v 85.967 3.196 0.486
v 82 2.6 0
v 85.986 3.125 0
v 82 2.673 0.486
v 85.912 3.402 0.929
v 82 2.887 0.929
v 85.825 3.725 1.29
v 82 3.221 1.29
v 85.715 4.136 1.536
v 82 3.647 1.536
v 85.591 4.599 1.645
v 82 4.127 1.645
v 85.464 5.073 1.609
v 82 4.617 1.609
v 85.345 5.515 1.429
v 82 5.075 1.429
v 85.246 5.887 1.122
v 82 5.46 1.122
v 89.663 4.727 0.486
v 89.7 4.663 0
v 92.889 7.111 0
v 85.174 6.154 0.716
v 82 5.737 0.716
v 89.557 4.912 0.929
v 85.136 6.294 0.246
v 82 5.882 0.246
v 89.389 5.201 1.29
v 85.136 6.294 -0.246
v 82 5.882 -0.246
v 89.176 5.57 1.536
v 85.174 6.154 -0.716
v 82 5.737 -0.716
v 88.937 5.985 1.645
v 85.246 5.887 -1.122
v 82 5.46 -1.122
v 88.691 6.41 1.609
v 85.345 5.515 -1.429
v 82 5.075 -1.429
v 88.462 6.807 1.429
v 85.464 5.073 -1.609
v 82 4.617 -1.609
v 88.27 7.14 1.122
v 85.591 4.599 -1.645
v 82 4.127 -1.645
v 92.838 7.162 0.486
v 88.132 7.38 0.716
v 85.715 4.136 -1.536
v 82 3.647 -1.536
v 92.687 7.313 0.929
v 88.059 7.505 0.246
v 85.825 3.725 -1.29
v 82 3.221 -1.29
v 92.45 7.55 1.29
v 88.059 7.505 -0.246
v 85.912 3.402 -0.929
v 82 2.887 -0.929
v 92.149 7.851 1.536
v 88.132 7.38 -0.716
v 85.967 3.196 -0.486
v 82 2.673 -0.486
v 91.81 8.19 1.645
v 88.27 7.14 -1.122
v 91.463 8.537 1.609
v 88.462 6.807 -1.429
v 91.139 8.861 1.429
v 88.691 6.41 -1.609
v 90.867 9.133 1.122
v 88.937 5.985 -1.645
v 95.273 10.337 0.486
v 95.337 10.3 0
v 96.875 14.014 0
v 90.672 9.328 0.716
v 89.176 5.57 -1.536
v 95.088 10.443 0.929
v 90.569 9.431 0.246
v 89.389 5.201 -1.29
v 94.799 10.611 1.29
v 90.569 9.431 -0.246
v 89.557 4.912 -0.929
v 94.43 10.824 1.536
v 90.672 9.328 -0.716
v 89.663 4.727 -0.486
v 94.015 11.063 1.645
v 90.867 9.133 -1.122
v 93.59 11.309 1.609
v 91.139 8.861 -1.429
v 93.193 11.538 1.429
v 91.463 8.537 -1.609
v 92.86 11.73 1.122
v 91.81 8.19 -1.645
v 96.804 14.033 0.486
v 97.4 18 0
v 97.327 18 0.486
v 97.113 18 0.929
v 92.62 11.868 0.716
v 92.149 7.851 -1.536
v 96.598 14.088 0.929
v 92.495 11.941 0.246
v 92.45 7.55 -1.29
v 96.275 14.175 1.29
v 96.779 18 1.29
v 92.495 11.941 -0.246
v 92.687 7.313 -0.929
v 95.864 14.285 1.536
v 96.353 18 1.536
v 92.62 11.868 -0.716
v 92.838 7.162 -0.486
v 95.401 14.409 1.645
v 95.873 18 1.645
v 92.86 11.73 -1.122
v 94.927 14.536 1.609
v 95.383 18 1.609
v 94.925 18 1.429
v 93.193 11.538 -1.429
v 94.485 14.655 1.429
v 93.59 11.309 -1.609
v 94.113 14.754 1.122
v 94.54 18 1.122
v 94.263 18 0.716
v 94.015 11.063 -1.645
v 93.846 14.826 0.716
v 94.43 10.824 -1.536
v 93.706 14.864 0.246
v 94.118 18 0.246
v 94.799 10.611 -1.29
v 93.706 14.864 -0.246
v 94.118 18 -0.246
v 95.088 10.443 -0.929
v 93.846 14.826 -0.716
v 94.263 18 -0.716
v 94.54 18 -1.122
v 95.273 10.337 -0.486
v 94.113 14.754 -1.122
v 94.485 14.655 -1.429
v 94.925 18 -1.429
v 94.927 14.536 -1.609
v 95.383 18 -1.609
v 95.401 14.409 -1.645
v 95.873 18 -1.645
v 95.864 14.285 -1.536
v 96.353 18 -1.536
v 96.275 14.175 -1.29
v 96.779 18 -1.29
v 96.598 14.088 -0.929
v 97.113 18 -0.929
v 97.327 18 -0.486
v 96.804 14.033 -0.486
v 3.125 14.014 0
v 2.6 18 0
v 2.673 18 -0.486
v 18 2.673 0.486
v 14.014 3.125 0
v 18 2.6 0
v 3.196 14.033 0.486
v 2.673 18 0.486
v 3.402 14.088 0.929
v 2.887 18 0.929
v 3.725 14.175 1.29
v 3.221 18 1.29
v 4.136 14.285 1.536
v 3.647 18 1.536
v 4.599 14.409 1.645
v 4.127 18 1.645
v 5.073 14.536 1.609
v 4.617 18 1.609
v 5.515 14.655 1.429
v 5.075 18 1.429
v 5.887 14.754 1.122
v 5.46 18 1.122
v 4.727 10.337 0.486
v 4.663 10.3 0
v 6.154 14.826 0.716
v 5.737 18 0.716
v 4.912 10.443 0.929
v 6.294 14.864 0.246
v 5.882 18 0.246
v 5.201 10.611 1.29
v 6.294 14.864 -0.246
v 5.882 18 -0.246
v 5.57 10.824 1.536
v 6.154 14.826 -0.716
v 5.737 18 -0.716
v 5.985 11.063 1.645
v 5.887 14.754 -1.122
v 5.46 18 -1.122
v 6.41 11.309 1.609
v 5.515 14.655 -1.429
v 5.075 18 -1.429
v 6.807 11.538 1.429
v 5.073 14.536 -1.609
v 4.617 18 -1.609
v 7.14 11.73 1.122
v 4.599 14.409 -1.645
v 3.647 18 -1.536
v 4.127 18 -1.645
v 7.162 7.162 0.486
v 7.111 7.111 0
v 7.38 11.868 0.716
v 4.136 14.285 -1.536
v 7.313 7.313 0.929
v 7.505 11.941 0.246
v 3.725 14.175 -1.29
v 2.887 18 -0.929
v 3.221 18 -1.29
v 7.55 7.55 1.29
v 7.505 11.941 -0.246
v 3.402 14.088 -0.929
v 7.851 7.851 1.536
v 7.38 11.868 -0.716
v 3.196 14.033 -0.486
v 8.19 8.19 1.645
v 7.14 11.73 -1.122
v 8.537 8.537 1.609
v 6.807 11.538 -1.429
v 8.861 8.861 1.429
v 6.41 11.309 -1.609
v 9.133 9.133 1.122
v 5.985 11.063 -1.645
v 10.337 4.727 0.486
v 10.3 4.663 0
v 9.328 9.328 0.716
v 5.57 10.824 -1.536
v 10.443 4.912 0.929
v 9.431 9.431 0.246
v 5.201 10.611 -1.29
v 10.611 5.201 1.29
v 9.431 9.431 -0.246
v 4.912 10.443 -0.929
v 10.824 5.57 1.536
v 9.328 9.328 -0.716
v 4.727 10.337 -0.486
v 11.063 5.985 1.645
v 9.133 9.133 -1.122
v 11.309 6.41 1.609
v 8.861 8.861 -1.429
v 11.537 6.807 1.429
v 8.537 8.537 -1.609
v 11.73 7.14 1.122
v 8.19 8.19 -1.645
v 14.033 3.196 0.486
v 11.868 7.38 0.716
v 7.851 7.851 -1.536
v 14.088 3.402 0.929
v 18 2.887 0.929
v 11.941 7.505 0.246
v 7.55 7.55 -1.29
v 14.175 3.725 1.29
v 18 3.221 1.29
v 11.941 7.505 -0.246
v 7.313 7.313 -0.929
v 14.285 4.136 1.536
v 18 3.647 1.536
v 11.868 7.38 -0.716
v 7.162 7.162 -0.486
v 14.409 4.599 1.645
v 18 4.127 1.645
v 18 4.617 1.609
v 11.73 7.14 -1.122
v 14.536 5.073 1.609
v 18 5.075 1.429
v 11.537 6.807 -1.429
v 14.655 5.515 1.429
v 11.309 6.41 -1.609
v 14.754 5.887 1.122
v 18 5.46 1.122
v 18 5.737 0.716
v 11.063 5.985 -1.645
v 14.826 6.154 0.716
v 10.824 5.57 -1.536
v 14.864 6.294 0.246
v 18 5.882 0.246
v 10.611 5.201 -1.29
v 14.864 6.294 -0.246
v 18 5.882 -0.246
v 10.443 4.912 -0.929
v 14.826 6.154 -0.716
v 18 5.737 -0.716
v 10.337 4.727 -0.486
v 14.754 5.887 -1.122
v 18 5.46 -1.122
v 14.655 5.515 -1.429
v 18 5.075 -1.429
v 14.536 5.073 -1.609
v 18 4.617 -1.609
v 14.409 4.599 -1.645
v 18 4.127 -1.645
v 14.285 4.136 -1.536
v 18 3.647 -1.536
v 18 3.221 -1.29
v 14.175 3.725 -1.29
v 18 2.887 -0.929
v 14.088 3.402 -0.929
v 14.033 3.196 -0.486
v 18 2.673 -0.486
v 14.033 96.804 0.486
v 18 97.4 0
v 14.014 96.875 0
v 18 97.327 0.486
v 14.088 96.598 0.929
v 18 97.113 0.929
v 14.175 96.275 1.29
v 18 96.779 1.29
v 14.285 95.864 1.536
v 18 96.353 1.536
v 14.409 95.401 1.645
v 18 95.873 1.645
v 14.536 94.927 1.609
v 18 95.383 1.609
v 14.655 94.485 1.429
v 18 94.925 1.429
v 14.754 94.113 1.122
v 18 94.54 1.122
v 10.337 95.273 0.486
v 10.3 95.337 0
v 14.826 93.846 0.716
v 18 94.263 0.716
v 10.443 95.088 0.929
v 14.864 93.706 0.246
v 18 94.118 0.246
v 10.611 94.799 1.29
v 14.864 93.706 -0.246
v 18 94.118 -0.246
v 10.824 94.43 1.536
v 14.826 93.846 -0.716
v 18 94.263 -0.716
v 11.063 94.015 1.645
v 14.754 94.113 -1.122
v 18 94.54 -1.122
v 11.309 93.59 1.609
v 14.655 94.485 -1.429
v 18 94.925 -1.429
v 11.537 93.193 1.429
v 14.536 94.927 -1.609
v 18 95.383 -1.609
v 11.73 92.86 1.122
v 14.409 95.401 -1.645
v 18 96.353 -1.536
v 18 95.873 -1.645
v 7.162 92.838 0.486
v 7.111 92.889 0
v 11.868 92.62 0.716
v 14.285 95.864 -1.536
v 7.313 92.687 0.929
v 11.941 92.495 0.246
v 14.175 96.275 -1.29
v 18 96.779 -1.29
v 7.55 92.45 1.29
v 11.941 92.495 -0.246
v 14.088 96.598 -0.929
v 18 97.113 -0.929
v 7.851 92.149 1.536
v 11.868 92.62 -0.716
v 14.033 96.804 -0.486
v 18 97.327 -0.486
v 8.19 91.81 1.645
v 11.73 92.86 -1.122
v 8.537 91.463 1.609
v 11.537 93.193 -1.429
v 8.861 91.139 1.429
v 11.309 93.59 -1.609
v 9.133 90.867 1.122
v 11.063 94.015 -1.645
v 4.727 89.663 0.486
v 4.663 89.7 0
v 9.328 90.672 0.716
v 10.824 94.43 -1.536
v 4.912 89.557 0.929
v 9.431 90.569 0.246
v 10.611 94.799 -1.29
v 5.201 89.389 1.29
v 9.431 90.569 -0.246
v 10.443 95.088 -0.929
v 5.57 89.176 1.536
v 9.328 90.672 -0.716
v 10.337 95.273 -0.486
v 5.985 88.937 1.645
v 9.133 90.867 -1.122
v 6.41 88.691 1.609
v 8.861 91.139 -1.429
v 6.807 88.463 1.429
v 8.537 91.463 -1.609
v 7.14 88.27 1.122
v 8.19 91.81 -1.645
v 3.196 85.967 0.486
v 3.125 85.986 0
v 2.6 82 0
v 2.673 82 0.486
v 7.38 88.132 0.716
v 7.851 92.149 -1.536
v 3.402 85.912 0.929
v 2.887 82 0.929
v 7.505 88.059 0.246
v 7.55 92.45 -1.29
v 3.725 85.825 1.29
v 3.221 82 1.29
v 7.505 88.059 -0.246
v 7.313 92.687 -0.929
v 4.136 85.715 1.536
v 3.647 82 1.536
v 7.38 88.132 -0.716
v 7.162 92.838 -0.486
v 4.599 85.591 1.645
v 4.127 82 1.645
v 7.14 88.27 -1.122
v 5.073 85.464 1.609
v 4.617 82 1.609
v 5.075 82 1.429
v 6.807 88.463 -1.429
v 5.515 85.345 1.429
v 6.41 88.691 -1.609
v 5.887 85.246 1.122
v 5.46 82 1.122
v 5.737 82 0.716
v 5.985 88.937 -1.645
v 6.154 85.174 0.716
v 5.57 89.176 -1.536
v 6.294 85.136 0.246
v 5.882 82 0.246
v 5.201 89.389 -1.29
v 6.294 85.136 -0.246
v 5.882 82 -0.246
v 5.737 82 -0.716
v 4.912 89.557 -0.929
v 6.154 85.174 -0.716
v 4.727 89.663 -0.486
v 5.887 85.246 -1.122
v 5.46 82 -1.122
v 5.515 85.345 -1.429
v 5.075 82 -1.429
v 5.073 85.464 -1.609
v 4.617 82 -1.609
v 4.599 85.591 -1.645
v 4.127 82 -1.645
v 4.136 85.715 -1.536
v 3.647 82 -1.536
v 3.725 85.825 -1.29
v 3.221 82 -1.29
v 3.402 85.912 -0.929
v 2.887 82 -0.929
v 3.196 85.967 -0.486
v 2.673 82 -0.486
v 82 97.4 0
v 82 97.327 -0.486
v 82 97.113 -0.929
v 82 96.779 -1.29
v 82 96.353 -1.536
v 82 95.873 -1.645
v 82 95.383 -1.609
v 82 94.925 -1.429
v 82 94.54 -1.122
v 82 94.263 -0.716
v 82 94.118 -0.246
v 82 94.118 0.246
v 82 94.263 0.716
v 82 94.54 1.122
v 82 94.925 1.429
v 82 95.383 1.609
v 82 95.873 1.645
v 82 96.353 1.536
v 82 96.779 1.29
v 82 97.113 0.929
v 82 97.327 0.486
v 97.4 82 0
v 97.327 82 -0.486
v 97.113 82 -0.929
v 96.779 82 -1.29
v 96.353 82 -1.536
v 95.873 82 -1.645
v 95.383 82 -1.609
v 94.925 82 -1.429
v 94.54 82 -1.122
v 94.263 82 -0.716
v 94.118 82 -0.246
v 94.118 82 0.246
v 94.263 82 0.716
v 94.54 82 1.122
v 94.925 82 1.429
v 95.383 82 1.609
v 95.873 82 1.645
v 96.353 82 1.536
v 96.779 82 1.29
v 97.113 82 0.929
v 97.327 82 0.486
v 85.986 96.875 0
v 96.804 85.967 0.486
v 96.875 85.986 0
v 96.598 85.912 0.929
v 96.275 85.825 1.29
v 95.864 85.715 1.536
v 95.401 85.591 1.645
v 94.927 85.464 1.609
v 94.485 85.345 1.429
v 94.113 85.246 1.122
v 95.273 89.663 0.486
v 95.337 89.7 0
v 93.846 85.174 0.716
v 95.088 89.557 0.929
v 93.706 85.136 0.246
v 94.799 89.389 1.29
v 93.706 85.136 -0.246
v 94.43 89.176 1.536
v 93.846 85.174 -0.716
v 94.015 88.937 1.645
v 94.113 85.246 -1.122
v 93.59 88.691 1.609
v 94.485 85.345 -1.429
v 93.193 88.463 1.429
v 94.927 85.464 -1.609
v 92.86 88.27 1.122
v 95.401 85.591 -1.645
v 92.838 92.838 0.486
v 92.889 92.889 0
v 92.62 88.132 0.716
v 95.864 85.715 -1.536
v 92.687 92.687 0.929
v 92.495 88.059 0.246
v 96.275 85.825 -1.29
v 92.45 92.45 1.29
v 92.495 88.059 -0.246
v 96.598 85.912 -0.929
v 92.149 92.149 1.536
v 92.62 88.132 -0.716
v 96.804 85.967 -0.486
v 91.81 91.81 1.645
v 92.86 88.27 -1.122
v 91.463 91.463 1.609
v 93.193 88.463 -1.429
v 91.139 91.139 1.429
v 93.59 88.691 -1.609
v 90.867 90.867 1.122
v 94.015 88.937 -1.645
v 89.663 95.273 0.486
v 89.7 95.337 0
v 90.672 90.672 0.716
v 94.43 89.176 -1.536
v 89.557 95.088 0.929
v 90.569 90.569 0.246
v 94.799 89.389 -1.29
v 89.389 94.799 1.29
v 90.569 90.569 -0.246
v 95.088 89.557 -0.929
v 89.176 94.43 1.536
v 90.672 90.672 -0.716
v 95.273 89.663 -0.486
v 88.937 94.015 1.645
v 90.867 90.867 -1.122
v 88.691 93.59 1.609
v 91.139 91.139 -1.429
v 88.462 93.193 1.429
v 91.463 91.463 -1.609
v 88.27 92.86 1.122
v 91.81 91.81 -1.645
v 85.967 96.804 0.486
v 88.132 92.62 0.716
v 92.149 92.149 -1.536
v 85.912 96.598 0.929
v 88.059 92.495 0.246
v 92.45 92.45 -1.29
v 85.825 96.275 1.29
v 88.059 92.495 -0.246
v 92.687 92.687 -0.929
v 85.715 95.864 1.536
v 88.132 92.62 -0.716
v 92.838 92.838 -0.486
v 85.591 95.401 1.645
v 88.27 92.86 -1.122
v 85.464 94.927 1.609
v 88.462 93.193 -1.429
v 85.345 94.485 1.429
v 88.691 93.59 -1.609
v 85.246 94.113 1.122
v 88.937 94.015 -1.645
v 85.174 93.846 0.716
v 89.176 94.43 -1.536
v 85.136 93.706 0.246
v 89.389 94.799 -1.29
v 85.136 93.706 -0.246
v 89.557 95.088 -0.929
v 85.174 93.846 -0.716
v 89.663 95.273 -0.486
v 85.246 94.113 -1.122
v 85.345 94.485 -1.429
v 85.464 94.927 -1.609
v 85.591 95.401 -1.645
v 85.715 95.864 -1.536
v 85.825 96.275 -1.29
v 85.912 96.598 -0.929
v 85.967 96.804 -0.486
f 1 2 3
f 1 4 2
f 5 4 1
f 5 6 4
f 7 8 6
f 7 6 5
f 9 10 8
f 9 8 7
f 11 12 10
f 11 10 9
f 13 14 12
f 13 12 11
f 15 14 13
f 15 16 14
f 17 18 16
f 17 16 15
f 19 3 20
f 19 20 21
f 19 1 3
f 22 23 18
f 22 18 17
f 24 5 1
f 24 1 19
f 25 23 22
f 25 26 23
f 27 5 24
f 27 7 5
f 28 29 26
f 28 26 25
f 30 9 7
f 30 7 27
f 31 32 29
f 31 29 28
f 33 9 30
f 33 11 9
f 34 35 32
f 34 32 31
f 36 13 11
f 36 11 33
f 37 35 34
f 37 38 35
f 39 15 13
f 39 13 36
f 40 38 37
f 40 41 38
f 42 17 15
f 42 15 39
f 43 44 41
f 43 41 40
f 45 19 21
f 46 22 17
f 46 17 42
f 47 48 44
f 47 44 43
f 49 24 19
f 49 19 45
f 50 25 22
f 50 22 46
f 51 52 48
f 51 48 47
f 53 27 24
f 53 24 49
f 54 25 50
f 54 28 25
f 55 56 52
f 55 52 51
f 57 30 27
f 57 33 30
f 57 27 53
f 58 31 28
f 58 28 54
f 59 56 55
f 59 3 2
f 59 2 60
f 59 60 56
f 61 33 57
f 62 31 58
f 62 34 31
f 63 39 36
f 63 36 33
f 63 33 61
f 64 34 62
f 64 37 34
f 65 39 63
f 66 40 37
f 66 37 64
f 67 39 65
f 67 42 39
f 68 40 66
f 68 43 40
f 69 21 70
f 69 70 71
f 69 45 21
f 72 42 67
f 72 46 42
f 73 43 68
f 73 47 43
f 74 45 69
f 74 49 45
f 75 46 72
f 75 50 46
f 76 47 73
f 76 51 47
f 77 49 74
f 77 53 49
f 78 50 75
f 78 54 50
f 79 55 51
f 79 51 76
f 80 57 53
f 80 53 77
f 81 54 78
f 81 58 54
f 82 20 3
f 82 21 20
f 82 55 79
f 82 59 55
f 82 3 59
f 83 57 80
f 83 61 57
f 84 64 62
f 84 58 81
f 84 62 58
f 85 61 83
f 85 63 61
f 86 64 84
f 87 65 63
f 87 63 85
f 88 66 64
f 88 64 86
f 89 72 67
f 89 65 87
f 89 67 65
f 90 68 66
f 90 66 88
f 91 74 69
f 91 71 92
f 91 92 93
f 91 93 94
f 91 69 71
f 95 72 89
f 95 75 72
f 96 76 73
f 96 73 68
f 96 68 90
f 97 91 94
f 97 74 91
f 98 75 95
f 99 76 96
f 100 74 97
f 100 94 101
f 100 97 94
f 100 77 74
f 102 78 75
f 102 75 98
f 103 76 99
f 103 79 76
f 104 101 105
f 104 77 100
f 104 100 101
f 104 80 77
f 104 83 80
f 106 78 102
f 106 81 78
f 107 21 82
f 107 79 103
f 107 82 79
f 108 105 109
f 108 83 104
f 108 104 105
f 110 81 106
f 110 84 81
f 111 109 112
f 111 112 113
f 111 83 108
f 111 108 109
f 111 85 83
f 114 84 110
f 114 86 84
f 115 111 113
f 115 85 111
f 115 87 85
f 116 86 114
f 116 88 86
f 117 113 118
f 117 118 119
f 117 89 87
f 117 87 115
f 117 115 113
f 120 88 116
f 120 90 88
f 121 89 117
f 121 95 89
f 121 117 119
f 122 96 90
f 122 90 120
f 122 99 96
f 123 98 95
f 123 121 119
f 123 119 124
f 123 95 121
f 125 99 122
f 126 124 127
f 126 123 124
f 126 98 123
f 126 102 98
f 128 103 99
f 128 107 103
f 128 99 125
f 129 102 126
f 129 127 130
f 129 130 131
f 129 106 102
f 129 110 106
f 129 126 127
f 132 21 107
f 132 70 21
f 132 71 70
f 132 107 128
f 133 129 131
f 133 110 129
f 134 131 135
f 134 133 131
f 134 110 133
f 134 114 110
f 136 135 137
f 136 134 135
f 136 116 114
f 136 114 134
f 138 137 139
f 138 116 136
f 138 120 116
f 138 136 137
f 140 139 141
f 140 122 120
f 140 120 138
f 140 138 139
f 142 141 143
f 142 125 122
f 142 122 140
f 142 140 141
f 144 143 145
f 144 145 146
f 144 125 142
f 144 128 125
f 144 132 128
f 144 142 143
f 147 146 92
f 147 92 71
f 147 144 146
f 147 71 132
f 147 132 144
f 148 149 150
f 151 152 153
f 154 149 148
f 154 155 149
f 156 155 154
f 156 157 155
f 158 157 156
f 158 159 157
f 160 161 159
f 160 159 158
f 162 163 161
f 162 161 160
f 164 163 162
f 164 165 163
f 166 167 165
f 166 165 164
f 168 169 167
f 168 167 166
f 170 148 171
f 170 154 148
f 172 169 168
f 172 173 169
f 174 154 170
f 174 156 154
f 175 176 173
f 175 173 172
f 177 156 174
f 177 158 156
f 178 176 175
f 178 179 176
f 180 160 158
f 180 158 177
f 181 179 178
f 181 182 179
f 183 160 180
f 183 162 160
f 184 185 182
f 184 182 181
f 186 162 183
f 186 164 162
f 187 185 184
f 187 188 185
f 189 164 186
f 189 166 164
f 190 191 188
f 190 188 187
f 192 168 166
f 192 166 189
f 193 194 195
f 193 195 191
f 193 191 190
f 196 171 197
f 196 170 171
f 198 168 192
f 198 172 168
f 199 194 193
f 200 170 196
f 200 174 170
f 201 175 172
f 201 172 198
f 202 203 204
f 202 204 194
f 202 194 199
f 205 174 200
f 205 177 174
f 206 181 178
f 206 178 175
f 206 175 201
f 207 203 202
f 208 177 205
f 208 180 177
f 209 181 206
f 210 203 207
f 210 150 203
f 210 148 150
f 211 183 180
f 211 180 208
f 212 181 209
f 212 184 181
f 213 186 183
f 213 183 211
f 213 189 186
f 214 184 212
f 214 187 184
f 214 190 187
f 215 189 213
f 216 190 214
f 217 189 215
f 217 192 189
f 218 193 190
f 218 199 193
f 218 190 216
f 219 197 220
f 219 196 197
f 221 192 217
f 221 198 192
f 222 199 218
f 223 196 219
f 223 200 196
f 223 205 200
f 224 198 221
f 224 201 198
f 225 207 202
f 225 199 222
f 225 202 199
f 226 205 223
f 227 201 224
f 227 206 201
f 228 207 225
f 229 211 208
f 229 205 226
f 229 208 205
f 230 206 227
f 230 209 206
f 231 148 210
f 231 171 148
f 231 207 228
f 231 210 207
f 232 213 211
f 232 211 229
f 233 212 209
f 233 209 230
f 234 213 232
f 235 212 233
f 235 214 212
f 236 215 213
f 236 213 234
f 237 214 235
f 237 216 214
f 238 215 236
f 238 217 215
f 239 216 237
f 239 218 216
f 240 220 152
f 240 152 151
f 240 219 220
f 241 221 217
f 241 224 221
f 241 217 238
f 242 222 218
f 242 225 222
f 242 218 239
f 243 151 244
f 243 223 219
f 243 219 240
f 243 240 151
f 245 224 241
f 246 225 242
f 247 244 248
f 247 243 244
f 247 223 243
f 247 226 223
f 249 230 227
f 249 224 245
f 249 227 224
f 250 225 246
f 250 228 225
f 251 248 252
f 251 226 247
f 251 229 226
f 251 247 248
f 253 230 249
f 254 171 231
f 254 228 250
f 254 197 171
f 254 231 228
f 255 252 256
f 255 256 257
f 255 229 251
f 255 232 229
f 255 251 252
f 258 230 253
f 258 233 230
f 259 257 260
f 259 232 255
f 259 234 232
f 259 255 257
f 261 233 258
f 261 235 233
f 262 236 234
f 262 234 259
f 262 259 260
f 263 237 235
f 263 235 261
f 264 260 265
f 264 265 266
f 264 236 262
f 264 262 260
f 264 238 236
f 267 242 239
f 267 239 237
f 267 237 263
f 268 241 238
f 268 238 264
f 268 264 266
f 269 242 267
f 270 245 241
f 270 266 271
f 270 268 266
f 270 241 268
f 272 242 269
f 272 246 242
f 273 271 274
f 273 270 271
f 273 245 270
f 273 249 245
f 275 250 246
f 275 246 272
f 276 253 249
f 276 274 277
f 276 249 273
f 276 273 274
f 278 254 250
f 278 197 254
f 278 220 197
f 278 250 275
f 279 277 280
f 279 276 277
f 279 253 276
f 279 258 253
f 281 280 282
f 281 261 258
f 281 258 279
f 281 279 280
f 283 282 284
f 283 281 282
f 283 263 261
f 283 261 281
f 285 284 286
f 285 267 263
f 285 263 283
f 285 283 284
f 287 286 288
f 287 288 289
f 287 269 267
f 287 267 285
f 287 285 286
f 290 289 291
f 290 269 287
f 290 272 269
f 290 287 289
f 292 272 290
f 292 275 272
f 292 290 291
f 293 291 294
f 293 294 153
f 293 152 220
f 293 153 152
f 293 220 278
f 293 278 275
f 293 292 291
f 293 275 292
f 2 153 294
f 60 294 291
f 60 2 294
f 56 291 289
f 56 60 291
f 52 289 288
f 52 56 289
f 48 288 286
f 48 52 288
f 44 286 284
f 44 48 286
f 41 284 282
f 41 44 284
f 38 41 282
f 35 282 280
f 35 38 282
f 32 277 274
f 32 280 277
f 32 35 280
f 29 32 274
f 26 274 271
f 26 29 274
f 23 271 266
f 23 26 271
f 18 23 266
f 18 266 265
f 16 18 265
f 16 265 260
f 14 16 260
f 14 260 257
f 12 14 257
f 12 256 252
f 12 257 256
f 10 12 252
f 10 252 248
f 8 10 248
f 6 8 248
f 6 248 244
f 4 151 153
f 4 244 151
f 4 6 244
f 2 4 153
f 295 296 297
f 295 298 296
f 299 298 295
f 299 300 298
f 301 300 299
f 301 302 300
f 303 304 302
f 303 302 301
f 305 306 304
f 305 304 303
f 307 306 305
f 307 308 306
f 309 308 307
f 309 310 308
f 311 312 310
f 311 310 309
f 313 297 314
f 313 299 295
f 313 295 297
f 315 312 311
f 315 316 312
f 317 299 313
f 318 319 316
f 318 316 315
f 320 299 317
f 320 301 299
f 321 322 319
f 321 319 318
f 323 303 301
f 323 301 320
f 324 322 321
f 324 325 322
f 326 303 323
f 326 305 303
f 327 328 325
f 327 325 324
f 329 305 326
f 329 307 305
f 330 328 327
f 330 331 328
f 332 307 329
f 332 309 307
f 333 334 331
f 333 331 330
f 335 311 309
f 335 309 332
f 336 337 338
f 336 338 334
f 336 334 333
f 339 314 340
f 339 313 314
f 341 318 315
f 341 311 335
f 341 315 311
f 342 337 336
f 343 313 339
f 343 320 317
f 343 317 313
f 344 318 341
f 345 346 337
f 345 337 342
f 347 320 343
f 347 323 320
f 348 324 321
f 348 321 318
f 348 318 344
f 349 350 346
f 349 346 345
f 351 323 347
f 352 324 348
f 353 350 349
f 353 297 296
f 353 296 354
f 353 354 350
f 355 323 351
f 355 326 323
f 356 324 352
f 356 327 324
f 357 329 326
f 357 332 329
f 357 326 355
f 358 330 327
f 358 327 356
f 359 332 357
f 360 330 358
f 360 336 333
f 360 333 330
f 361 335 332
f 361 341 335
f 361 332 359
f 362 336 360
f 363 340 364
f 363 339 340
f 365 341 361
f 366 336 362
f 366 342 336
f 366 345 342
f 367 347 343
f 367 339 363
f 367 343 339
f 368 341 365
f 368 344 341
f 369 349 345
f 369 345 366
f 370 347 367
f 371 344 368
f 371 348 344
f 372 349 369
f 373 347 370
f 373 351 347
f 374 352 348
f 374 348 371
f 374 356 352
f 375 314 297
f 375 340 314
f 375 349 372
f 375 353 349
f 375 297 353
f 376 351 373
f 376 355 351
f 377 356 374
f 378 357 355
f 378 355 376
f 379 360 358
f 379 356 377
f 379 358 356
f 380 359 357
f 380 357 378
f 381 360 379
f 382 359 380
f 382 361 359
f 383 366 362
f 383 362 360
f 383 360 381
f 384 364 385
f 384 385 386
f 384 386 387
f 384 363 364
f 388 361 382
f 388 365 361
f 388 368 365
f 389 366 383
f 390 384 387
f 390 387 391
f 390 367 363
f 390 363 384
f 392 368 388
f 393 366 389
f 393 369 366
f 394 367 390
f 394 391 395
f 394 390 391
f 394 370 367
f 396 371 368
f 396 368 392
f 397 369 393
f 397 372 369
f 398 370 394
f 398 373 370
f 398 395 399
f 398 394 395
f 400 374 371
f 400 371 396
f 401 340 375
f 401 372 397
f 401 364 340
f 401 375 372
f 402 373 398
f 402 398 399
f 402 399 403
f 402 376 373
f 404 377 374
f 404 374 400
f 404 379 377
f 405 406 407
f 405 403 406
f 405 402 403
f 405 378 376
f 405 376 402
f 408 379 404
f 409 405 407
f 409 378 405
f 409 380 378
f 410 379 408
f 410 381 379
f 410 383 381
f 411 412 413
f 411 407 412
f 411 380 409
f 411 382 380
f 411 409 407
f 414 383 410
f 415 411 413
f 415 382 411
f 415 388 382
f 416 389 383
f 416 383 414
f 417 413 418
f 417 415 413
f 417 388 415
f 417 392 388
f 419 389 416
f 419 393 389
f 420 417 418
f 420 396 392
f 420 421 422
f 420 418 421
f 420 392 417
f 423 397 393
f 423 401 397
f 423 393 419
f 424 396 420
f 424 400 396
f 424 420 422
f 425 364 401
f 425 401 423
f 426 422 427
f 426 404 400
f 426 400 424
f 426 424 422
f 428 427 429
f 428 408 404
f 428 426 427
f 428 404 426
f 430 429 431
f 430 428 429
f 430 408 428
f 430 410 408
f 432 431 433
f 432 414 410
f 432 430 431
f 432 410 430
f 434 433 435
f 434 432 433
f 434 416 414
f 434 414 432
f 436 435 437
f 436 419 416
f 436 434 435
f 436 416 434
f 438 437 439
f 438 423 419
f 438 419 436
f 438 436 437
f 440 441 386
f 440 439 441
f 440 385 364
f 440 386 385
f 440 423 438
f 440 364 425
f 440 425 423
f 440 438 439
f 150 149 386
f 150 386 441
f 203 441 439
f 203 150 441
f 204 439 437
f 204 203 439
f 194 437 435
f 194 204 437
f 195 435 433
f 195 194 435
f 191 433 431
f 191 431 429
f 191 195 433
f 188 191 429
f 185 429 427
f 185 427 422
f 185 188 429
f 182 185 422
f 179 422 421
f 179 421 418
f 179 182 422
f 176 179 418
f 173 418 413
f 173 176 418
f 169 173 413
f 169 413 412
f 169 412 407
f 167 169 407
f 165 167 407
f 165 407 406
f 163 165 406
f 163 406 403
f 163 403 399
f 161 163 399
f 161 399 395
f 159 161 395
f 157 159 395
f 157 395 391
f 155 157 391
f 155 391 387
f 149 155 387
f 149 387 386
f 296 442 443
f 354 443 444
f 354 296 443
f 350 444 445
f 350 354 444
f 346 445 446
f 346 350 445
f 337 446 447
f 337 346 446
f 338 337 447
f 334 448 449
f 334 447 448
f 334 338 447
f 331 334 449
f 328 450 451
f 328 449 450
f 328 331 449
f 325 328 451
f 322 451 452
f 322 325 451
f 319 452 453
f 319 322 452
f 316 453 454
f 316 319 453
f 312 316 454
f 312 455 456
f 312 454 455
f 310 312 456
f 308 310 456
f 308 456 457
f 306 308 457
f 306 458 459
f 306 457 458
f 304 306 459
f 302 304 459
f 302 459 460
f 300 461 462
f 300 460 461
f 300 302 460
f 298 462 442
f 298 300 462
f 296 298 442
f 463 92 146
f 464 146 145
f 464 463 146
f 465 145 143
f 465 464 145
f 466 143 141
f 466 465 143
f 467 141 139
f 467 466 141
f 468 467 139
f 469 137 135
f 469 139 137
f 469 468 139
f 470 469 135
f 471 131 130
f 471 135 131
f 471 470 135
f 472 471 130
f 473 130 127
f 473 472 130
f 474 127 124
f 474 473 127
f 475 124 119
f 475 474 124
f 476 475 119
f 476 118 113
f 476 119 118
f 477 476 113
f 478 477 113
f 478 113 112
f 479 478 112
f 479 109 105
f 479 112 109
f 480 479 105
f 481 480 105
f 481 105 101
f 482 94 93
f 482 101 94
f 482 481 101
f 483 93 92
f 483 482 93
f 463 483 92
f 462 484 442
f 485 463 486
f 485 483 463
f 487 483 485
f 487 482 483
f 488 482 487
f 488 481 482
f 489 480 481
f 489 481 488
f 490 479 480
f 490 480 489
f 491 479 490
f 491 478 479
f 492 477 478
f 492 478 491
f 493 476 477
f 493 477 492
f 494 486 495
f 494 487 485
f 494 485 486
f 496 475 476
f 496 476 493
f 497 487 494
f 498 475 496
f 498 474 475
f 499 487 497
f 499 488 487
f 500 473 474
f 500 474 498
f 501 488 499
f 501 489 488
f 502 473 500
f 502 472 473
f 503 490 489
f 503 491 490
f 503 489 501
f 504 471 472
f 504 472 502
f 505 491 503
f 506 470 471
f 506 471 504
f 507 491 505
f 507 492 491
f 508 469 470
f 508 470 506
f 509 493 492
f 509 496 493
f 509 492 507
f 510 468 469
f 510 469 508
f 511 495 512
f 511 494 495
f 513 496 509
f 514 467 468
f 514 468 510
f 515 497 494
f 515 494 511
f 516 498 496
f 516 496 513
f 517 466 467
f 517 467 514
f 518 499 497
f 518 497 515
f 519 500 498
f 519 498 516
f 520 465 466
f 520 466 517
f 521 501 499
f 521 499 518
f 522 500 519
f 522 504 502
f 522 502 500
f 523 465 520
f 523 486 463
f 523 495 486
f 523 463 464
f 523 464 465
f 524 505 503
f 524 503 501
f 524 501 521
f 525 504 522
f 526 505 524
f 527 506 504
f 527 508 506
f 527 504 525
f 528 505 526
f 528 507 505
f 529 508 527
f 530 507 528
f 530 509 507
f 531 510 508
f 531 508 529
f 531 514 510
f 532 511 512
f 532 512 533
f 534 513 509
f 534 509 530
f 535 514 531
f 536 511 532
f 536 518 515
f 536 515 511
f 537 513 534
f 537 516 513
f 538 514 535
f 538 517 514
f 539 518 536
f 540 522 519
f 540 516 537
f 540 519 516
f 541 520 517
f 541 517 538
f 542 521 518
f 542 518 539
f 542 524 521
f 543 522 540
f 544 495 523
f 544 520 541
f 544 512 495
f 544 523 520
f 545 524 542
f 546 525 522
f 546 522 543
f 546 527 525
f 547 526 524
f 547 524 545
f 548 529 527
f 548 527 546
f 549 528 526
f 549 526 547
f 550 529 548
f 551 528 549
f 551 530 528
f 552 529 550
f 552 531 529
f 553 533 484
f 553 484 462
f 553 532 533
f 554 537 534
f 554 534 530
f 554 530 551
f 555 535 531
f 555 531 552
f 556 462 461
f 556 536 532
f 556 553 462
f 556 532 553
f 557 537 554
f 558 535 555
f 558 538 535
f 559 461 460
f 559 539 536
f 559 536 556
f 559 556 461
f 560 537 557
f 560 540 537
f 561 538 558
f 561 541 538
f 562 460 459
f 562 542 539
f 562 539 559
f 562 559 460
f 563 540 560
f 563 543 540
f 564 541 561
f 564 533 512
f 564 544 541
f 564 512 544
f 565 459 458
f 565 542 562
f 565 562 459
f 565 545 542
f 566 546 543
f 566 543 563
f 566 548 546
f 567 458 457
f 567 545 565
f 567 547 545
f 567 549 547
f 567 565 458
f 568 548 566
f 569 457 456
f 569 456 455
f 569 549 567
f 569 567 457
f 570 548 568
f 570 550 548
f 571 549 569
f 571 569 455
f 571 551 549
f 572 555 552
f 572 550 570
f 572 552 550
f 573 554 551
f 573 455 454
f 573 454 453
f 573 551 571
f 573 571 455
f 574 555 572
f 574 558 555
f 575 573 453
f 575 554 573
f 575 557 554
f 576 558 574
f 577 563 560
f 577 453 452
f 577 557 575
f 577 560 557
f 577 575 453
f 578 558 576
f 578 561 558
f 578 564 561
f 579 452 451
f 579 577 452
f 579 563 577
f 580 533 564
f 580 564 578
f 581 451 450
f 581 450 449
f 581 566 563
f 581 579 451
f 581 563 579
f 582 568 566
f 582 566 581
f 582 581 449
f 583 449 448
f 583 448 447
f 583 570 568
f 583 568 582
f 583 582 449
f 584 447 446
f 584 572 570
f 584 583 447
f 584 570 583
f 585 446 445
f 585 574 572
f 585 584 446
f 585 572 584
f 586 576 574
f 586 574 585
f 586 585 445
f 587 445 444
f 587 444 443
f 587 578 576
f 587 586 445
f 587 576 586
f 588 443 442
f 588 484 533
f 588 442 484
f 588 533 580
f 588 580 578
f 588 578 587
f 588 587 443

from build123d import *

# Parameters (mm, degrees)
SWEEP1_PROFILE_R = 1.65


with BuildPart() as part:
    # Sweep1: sweep along a path in Sketch1
    with BuildLine(Plane.XY) as sweep1_path:
        Line((4.249998297, 82.00000012), (4.249998297, 18.00000012))
        ThreePointArc((4.249998297, 18.00000012), (8.277280056, 8.277281879), (17.999998297, 4.25000012))
        Line((17.999998297, 4.25000012), (81.999998297, 4.25000012))
        ThreePointArc((81.999998297, 4.25000012), (91.722716538, 8.277281879), (95.749998297, 18.00000012))
        Line((95.749998297, 18.00000012), (95.749998297, 82.00000012))
        ThreePointArc((95.749998297, 82.00000012), (91.722716538, 91.722718361), (81.999998297, 95.75000012))
        Line((81.999998297, 95.75000012), (17.999998297, 95.75000012))
        ThreePointArc((17.999998297, 95.75000012), (8.277280056, 91.722718361), (4.249998297, 82.00000012))
    # Sweep1 profile (on start of the path) → Sweep1 (sweep)
    with BuildSketch(Plane(origin=(4.249998297, 82.00000012, 0), x_dir=(-1, 0, 0), z_dir=(0, -1, 0))):
        Circle(SWEEP1_PROFILE_R)
    sweep(path=sweep1_path.line)


solid = part.part
